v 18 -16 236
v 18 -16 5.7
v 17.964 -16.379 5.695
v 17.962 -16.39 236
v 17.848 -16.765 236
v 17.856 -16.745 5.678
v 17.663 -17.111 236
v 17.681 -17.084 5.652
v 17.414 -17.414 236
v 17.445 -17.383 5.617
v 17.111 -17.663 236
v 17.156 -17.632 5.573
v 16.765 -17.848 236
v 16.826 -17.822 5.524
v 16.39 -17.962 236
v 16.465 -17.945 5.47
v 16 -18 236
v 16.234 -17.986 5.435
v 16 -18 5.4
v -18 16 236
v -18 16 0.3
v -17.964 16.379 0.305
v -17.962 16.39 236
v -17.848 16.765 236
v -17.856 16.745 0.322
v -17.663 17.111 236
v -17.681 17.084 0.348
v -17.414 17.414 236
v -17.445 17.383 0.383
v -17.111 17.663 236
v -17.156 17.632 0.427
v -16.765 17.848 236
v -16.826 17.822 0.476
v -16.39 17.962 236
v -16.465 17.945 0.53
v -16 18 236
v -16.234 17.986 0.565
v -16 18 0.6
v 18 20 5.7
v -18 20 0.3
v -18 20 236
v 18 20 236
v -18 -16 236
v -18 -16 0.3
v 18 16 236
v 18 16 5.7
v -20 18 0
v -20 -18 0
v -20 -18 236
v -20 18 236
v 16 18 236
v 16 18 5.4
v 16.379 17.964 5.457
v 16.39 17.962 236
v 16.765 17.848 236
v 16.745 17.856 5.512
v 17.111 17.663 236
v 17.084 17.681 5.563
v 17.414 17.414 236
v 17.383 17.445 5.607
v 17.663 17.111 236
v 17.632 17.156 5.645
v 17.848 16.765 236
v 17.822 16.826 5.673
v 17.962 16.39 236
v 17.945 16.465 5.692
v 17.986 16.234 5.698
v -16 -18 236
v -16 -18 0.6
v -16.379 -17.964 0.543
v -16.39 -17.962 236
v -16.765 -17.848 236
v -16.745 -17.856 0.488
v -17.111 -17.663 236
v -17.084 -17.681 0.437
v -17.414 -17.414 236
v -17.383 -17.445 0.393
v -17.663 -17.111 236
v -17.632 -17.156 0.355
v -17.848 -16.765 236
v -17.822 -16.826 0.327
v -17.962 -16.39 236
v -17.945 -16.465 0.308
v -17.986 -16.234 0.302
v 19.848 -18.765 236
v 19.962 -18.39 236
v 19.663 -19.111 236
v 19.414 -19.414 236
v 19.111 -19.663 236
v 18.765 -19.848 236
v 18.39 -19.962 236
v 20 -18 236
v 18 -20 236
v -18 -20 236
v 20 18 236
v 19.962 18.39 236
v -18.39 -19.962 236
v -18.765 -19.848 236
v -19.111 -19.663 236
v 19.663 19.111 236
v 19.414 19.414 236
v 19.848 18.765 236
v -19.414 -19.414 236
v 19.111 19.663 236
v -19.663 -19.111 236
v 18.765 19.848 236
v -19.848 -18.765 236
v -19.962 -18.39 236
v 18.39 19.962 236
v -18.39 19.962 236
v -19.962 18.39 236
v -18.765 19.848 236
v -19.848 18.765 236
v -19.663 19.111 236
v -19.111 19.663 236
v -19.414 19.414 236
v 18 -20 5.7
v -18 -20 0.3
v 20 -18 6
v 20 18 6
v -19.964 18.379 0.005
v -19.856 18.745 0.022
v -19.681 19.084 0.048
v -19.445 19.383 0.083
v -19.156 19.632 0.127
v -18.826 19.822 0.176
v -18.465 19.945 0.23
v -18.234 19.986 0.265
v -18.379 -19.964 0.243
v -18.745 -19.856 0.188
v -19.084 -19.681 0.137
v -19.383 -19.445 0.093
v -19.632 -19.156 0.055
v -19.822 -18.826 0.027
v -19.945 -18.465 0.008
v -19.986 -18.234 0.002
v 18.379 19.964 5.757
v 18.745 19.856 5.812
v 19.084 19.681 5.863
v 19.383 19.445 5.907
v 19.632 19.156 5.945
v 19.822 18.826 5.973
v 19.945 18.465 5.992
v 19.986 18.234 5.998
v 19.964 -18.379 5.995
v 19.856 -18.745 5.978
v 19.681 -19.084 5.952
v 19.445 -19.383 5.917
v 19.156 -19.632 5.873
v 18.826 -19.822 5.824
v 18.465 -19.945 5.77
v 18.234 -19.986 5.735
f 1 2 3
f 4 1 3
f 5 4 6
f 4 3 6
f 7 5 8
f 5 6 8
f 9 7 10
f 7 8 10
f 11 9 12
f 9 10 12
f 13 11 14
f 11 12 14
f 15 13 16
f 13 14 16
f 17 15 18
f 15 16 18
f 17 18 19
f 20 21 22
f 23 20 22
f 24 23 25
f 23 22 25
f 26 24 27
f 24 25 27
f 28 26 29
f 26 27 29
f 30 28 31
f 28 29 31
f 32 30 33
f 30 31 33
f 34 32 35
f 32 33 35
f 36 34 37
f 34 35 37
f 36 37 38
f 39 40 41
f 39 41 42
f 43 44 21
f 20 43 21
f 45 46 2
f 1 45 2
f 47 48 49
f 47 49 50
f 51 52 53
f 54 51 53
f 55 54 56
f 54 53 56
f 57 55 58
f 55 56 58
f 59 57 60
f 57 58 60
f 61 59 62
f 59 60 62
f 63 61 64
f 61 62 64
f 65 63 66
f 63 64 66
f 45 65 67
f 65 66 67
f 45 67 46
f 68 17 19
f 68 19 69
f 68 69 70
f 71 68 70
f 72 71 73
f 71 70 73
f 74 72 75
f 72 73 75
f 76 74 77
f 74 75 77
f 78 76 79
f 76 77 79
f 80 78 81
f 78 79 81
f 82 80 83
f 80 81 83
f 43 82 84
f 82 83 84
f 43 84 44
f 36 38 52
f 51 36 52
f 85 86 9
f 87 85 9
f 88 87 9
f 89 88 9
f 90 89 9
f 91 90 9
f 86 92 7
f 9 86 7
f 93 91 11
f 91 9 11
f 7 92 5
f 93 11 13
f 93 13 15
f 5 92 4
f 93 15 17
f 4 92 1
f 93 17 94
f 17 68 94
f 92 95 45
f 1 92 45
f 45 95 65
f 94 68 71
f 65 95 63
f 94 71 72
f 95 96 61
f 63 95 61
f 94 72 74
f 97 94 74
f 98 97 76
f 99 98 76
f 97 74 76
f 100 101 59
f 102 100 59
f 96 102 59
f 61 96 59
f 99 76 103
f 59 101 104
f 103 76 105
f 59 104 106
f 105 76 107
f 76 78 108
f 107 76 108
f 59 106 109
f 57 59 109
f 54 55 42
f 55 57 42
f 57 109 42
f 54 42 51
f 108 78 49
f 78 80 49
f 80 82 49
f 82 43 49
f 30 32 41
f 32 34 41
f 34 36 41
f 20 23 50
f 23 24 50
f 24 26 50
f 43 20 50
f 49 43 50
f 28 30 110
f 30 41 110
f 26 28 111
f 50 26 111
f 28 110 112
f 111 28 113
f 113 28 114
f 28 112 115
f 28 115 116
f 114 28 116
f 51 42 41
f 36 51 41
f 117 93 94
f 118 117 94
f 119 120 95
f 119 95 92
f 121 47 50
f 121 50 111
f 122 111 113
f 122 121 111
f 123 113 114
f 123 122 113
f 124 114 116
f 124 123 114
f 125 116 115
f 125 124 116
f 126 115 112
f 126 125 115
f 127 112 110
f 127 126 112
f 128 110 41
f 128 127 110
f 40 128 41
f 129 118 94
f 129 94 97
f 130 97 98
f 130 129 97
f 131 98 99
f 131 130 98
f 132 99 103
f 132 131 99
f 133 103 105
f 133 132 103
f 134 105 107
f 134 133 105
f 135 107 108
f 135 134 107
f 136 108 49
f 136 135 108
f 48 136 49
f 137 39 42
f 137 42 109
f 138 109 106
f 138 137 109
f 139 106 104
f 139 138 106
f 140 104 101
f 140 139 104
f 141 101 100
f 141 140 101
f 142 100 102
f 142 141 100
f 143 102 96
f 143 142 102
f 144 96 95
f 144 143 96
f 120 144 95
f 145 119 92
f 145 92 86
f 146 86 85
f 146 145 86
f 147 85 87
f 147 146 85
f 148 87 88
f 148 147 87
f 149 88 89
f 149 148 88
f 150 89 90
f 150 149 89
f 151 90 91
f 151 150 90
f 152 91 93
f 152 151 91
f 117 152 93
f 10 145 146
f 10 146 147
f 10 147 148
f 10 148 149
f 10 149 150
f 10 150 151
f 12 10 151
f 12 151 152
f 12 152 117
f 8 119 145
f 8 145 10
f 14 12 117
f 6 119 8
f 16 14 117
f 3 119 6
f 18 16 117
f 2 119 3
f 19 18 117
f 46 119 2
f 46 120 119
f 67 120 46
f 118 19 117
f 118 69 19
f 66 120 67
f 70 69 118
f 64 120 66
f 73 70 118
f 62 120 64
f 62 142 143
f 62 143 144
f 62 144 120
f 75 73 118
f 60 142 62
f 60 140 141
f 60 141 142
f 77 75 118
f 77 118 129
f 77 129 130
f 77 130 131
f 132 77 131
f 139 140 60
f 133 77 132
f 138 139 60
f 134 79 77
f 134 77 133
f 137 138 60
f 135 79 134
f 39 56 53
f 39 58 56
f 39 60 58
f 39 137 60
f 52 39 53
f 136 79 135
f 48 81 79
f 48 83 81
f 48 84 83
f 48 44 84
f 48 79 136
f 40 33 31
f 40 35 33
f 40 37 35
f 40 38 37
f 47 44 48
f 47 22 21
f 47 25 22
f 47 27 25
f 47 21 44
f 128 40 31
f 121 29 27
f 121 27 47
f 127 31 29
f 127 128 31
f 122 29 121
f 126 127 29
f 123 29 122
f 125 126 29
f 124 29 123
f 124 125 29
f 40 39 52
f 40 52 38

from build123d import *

# Parameters (mm, degrees)
EXTRUDE_1_DEPTH     = 236
CUT_EXTRUDE_1_DEPTH = 241.199916736


with BuildPart() as part:
    # Эскиз1 → Бобышка-Вытянуть1 (new body)
    with BuildSketch(Plane.XY):
        with BuildLine():
            Line((-18, 20), (18, 20))
            ThreePointArc((18, 20), (19.414213562, 19.414213562), (20, 18))
            Line((20, 18), (20, -18))
            ThreePointArc((20, -18), (19.414213562, -19.414213562), (18, -20))
            Line((18, -20), (-18, -20))
            ThreePointArc((-18, -20), (-19.414213562, -19.414213562), (-20, -18))
            Line((-20, -18), (-20, 18))
            ThreePointArc((-20, 18), (-19.414213562, 19.414213562), (-18, 20))
        make_face()
        with BuildLine():
            Line((-16, 18), (16, 18))
            ThreePointArc((16, 18), (17.414213562, 17.414213562), (18, 16))
            Line((18, 16), (18, -16))
            ThreePointArc((18, -16), (17.414213562, -17.414213562), (16, -18))
            Line((16, -18), (-16, -18))
            ThreePointArc((-16, -18), (-17.414213562, -17.414213562), (-18, -16))
            Line((-18, -16), (-18, 16))
            ThreePointArc((-18, 16), (-17.414213562, 17.414213562), (-16, 18))
        make_face(mode=Mode.SUBTRACT)
    extrude(amount=EXTRUDE_1_DEPTH)

    # Эскиз2 → Вырез-Вытянуть1 (cut, through all)
    with BuildSketch(Plane(origin=(0, 20, 0), x_dir=(1, 0, 0), z_dir=(0, 1, 0))):
        Polygon((20, -6), (-20, 0), (20, 0), align=None)
    extrude(amount=-CUT_EXTRUDE_1_DEPTH, mode=Mode.SUBTRACT)


solid = part.part
